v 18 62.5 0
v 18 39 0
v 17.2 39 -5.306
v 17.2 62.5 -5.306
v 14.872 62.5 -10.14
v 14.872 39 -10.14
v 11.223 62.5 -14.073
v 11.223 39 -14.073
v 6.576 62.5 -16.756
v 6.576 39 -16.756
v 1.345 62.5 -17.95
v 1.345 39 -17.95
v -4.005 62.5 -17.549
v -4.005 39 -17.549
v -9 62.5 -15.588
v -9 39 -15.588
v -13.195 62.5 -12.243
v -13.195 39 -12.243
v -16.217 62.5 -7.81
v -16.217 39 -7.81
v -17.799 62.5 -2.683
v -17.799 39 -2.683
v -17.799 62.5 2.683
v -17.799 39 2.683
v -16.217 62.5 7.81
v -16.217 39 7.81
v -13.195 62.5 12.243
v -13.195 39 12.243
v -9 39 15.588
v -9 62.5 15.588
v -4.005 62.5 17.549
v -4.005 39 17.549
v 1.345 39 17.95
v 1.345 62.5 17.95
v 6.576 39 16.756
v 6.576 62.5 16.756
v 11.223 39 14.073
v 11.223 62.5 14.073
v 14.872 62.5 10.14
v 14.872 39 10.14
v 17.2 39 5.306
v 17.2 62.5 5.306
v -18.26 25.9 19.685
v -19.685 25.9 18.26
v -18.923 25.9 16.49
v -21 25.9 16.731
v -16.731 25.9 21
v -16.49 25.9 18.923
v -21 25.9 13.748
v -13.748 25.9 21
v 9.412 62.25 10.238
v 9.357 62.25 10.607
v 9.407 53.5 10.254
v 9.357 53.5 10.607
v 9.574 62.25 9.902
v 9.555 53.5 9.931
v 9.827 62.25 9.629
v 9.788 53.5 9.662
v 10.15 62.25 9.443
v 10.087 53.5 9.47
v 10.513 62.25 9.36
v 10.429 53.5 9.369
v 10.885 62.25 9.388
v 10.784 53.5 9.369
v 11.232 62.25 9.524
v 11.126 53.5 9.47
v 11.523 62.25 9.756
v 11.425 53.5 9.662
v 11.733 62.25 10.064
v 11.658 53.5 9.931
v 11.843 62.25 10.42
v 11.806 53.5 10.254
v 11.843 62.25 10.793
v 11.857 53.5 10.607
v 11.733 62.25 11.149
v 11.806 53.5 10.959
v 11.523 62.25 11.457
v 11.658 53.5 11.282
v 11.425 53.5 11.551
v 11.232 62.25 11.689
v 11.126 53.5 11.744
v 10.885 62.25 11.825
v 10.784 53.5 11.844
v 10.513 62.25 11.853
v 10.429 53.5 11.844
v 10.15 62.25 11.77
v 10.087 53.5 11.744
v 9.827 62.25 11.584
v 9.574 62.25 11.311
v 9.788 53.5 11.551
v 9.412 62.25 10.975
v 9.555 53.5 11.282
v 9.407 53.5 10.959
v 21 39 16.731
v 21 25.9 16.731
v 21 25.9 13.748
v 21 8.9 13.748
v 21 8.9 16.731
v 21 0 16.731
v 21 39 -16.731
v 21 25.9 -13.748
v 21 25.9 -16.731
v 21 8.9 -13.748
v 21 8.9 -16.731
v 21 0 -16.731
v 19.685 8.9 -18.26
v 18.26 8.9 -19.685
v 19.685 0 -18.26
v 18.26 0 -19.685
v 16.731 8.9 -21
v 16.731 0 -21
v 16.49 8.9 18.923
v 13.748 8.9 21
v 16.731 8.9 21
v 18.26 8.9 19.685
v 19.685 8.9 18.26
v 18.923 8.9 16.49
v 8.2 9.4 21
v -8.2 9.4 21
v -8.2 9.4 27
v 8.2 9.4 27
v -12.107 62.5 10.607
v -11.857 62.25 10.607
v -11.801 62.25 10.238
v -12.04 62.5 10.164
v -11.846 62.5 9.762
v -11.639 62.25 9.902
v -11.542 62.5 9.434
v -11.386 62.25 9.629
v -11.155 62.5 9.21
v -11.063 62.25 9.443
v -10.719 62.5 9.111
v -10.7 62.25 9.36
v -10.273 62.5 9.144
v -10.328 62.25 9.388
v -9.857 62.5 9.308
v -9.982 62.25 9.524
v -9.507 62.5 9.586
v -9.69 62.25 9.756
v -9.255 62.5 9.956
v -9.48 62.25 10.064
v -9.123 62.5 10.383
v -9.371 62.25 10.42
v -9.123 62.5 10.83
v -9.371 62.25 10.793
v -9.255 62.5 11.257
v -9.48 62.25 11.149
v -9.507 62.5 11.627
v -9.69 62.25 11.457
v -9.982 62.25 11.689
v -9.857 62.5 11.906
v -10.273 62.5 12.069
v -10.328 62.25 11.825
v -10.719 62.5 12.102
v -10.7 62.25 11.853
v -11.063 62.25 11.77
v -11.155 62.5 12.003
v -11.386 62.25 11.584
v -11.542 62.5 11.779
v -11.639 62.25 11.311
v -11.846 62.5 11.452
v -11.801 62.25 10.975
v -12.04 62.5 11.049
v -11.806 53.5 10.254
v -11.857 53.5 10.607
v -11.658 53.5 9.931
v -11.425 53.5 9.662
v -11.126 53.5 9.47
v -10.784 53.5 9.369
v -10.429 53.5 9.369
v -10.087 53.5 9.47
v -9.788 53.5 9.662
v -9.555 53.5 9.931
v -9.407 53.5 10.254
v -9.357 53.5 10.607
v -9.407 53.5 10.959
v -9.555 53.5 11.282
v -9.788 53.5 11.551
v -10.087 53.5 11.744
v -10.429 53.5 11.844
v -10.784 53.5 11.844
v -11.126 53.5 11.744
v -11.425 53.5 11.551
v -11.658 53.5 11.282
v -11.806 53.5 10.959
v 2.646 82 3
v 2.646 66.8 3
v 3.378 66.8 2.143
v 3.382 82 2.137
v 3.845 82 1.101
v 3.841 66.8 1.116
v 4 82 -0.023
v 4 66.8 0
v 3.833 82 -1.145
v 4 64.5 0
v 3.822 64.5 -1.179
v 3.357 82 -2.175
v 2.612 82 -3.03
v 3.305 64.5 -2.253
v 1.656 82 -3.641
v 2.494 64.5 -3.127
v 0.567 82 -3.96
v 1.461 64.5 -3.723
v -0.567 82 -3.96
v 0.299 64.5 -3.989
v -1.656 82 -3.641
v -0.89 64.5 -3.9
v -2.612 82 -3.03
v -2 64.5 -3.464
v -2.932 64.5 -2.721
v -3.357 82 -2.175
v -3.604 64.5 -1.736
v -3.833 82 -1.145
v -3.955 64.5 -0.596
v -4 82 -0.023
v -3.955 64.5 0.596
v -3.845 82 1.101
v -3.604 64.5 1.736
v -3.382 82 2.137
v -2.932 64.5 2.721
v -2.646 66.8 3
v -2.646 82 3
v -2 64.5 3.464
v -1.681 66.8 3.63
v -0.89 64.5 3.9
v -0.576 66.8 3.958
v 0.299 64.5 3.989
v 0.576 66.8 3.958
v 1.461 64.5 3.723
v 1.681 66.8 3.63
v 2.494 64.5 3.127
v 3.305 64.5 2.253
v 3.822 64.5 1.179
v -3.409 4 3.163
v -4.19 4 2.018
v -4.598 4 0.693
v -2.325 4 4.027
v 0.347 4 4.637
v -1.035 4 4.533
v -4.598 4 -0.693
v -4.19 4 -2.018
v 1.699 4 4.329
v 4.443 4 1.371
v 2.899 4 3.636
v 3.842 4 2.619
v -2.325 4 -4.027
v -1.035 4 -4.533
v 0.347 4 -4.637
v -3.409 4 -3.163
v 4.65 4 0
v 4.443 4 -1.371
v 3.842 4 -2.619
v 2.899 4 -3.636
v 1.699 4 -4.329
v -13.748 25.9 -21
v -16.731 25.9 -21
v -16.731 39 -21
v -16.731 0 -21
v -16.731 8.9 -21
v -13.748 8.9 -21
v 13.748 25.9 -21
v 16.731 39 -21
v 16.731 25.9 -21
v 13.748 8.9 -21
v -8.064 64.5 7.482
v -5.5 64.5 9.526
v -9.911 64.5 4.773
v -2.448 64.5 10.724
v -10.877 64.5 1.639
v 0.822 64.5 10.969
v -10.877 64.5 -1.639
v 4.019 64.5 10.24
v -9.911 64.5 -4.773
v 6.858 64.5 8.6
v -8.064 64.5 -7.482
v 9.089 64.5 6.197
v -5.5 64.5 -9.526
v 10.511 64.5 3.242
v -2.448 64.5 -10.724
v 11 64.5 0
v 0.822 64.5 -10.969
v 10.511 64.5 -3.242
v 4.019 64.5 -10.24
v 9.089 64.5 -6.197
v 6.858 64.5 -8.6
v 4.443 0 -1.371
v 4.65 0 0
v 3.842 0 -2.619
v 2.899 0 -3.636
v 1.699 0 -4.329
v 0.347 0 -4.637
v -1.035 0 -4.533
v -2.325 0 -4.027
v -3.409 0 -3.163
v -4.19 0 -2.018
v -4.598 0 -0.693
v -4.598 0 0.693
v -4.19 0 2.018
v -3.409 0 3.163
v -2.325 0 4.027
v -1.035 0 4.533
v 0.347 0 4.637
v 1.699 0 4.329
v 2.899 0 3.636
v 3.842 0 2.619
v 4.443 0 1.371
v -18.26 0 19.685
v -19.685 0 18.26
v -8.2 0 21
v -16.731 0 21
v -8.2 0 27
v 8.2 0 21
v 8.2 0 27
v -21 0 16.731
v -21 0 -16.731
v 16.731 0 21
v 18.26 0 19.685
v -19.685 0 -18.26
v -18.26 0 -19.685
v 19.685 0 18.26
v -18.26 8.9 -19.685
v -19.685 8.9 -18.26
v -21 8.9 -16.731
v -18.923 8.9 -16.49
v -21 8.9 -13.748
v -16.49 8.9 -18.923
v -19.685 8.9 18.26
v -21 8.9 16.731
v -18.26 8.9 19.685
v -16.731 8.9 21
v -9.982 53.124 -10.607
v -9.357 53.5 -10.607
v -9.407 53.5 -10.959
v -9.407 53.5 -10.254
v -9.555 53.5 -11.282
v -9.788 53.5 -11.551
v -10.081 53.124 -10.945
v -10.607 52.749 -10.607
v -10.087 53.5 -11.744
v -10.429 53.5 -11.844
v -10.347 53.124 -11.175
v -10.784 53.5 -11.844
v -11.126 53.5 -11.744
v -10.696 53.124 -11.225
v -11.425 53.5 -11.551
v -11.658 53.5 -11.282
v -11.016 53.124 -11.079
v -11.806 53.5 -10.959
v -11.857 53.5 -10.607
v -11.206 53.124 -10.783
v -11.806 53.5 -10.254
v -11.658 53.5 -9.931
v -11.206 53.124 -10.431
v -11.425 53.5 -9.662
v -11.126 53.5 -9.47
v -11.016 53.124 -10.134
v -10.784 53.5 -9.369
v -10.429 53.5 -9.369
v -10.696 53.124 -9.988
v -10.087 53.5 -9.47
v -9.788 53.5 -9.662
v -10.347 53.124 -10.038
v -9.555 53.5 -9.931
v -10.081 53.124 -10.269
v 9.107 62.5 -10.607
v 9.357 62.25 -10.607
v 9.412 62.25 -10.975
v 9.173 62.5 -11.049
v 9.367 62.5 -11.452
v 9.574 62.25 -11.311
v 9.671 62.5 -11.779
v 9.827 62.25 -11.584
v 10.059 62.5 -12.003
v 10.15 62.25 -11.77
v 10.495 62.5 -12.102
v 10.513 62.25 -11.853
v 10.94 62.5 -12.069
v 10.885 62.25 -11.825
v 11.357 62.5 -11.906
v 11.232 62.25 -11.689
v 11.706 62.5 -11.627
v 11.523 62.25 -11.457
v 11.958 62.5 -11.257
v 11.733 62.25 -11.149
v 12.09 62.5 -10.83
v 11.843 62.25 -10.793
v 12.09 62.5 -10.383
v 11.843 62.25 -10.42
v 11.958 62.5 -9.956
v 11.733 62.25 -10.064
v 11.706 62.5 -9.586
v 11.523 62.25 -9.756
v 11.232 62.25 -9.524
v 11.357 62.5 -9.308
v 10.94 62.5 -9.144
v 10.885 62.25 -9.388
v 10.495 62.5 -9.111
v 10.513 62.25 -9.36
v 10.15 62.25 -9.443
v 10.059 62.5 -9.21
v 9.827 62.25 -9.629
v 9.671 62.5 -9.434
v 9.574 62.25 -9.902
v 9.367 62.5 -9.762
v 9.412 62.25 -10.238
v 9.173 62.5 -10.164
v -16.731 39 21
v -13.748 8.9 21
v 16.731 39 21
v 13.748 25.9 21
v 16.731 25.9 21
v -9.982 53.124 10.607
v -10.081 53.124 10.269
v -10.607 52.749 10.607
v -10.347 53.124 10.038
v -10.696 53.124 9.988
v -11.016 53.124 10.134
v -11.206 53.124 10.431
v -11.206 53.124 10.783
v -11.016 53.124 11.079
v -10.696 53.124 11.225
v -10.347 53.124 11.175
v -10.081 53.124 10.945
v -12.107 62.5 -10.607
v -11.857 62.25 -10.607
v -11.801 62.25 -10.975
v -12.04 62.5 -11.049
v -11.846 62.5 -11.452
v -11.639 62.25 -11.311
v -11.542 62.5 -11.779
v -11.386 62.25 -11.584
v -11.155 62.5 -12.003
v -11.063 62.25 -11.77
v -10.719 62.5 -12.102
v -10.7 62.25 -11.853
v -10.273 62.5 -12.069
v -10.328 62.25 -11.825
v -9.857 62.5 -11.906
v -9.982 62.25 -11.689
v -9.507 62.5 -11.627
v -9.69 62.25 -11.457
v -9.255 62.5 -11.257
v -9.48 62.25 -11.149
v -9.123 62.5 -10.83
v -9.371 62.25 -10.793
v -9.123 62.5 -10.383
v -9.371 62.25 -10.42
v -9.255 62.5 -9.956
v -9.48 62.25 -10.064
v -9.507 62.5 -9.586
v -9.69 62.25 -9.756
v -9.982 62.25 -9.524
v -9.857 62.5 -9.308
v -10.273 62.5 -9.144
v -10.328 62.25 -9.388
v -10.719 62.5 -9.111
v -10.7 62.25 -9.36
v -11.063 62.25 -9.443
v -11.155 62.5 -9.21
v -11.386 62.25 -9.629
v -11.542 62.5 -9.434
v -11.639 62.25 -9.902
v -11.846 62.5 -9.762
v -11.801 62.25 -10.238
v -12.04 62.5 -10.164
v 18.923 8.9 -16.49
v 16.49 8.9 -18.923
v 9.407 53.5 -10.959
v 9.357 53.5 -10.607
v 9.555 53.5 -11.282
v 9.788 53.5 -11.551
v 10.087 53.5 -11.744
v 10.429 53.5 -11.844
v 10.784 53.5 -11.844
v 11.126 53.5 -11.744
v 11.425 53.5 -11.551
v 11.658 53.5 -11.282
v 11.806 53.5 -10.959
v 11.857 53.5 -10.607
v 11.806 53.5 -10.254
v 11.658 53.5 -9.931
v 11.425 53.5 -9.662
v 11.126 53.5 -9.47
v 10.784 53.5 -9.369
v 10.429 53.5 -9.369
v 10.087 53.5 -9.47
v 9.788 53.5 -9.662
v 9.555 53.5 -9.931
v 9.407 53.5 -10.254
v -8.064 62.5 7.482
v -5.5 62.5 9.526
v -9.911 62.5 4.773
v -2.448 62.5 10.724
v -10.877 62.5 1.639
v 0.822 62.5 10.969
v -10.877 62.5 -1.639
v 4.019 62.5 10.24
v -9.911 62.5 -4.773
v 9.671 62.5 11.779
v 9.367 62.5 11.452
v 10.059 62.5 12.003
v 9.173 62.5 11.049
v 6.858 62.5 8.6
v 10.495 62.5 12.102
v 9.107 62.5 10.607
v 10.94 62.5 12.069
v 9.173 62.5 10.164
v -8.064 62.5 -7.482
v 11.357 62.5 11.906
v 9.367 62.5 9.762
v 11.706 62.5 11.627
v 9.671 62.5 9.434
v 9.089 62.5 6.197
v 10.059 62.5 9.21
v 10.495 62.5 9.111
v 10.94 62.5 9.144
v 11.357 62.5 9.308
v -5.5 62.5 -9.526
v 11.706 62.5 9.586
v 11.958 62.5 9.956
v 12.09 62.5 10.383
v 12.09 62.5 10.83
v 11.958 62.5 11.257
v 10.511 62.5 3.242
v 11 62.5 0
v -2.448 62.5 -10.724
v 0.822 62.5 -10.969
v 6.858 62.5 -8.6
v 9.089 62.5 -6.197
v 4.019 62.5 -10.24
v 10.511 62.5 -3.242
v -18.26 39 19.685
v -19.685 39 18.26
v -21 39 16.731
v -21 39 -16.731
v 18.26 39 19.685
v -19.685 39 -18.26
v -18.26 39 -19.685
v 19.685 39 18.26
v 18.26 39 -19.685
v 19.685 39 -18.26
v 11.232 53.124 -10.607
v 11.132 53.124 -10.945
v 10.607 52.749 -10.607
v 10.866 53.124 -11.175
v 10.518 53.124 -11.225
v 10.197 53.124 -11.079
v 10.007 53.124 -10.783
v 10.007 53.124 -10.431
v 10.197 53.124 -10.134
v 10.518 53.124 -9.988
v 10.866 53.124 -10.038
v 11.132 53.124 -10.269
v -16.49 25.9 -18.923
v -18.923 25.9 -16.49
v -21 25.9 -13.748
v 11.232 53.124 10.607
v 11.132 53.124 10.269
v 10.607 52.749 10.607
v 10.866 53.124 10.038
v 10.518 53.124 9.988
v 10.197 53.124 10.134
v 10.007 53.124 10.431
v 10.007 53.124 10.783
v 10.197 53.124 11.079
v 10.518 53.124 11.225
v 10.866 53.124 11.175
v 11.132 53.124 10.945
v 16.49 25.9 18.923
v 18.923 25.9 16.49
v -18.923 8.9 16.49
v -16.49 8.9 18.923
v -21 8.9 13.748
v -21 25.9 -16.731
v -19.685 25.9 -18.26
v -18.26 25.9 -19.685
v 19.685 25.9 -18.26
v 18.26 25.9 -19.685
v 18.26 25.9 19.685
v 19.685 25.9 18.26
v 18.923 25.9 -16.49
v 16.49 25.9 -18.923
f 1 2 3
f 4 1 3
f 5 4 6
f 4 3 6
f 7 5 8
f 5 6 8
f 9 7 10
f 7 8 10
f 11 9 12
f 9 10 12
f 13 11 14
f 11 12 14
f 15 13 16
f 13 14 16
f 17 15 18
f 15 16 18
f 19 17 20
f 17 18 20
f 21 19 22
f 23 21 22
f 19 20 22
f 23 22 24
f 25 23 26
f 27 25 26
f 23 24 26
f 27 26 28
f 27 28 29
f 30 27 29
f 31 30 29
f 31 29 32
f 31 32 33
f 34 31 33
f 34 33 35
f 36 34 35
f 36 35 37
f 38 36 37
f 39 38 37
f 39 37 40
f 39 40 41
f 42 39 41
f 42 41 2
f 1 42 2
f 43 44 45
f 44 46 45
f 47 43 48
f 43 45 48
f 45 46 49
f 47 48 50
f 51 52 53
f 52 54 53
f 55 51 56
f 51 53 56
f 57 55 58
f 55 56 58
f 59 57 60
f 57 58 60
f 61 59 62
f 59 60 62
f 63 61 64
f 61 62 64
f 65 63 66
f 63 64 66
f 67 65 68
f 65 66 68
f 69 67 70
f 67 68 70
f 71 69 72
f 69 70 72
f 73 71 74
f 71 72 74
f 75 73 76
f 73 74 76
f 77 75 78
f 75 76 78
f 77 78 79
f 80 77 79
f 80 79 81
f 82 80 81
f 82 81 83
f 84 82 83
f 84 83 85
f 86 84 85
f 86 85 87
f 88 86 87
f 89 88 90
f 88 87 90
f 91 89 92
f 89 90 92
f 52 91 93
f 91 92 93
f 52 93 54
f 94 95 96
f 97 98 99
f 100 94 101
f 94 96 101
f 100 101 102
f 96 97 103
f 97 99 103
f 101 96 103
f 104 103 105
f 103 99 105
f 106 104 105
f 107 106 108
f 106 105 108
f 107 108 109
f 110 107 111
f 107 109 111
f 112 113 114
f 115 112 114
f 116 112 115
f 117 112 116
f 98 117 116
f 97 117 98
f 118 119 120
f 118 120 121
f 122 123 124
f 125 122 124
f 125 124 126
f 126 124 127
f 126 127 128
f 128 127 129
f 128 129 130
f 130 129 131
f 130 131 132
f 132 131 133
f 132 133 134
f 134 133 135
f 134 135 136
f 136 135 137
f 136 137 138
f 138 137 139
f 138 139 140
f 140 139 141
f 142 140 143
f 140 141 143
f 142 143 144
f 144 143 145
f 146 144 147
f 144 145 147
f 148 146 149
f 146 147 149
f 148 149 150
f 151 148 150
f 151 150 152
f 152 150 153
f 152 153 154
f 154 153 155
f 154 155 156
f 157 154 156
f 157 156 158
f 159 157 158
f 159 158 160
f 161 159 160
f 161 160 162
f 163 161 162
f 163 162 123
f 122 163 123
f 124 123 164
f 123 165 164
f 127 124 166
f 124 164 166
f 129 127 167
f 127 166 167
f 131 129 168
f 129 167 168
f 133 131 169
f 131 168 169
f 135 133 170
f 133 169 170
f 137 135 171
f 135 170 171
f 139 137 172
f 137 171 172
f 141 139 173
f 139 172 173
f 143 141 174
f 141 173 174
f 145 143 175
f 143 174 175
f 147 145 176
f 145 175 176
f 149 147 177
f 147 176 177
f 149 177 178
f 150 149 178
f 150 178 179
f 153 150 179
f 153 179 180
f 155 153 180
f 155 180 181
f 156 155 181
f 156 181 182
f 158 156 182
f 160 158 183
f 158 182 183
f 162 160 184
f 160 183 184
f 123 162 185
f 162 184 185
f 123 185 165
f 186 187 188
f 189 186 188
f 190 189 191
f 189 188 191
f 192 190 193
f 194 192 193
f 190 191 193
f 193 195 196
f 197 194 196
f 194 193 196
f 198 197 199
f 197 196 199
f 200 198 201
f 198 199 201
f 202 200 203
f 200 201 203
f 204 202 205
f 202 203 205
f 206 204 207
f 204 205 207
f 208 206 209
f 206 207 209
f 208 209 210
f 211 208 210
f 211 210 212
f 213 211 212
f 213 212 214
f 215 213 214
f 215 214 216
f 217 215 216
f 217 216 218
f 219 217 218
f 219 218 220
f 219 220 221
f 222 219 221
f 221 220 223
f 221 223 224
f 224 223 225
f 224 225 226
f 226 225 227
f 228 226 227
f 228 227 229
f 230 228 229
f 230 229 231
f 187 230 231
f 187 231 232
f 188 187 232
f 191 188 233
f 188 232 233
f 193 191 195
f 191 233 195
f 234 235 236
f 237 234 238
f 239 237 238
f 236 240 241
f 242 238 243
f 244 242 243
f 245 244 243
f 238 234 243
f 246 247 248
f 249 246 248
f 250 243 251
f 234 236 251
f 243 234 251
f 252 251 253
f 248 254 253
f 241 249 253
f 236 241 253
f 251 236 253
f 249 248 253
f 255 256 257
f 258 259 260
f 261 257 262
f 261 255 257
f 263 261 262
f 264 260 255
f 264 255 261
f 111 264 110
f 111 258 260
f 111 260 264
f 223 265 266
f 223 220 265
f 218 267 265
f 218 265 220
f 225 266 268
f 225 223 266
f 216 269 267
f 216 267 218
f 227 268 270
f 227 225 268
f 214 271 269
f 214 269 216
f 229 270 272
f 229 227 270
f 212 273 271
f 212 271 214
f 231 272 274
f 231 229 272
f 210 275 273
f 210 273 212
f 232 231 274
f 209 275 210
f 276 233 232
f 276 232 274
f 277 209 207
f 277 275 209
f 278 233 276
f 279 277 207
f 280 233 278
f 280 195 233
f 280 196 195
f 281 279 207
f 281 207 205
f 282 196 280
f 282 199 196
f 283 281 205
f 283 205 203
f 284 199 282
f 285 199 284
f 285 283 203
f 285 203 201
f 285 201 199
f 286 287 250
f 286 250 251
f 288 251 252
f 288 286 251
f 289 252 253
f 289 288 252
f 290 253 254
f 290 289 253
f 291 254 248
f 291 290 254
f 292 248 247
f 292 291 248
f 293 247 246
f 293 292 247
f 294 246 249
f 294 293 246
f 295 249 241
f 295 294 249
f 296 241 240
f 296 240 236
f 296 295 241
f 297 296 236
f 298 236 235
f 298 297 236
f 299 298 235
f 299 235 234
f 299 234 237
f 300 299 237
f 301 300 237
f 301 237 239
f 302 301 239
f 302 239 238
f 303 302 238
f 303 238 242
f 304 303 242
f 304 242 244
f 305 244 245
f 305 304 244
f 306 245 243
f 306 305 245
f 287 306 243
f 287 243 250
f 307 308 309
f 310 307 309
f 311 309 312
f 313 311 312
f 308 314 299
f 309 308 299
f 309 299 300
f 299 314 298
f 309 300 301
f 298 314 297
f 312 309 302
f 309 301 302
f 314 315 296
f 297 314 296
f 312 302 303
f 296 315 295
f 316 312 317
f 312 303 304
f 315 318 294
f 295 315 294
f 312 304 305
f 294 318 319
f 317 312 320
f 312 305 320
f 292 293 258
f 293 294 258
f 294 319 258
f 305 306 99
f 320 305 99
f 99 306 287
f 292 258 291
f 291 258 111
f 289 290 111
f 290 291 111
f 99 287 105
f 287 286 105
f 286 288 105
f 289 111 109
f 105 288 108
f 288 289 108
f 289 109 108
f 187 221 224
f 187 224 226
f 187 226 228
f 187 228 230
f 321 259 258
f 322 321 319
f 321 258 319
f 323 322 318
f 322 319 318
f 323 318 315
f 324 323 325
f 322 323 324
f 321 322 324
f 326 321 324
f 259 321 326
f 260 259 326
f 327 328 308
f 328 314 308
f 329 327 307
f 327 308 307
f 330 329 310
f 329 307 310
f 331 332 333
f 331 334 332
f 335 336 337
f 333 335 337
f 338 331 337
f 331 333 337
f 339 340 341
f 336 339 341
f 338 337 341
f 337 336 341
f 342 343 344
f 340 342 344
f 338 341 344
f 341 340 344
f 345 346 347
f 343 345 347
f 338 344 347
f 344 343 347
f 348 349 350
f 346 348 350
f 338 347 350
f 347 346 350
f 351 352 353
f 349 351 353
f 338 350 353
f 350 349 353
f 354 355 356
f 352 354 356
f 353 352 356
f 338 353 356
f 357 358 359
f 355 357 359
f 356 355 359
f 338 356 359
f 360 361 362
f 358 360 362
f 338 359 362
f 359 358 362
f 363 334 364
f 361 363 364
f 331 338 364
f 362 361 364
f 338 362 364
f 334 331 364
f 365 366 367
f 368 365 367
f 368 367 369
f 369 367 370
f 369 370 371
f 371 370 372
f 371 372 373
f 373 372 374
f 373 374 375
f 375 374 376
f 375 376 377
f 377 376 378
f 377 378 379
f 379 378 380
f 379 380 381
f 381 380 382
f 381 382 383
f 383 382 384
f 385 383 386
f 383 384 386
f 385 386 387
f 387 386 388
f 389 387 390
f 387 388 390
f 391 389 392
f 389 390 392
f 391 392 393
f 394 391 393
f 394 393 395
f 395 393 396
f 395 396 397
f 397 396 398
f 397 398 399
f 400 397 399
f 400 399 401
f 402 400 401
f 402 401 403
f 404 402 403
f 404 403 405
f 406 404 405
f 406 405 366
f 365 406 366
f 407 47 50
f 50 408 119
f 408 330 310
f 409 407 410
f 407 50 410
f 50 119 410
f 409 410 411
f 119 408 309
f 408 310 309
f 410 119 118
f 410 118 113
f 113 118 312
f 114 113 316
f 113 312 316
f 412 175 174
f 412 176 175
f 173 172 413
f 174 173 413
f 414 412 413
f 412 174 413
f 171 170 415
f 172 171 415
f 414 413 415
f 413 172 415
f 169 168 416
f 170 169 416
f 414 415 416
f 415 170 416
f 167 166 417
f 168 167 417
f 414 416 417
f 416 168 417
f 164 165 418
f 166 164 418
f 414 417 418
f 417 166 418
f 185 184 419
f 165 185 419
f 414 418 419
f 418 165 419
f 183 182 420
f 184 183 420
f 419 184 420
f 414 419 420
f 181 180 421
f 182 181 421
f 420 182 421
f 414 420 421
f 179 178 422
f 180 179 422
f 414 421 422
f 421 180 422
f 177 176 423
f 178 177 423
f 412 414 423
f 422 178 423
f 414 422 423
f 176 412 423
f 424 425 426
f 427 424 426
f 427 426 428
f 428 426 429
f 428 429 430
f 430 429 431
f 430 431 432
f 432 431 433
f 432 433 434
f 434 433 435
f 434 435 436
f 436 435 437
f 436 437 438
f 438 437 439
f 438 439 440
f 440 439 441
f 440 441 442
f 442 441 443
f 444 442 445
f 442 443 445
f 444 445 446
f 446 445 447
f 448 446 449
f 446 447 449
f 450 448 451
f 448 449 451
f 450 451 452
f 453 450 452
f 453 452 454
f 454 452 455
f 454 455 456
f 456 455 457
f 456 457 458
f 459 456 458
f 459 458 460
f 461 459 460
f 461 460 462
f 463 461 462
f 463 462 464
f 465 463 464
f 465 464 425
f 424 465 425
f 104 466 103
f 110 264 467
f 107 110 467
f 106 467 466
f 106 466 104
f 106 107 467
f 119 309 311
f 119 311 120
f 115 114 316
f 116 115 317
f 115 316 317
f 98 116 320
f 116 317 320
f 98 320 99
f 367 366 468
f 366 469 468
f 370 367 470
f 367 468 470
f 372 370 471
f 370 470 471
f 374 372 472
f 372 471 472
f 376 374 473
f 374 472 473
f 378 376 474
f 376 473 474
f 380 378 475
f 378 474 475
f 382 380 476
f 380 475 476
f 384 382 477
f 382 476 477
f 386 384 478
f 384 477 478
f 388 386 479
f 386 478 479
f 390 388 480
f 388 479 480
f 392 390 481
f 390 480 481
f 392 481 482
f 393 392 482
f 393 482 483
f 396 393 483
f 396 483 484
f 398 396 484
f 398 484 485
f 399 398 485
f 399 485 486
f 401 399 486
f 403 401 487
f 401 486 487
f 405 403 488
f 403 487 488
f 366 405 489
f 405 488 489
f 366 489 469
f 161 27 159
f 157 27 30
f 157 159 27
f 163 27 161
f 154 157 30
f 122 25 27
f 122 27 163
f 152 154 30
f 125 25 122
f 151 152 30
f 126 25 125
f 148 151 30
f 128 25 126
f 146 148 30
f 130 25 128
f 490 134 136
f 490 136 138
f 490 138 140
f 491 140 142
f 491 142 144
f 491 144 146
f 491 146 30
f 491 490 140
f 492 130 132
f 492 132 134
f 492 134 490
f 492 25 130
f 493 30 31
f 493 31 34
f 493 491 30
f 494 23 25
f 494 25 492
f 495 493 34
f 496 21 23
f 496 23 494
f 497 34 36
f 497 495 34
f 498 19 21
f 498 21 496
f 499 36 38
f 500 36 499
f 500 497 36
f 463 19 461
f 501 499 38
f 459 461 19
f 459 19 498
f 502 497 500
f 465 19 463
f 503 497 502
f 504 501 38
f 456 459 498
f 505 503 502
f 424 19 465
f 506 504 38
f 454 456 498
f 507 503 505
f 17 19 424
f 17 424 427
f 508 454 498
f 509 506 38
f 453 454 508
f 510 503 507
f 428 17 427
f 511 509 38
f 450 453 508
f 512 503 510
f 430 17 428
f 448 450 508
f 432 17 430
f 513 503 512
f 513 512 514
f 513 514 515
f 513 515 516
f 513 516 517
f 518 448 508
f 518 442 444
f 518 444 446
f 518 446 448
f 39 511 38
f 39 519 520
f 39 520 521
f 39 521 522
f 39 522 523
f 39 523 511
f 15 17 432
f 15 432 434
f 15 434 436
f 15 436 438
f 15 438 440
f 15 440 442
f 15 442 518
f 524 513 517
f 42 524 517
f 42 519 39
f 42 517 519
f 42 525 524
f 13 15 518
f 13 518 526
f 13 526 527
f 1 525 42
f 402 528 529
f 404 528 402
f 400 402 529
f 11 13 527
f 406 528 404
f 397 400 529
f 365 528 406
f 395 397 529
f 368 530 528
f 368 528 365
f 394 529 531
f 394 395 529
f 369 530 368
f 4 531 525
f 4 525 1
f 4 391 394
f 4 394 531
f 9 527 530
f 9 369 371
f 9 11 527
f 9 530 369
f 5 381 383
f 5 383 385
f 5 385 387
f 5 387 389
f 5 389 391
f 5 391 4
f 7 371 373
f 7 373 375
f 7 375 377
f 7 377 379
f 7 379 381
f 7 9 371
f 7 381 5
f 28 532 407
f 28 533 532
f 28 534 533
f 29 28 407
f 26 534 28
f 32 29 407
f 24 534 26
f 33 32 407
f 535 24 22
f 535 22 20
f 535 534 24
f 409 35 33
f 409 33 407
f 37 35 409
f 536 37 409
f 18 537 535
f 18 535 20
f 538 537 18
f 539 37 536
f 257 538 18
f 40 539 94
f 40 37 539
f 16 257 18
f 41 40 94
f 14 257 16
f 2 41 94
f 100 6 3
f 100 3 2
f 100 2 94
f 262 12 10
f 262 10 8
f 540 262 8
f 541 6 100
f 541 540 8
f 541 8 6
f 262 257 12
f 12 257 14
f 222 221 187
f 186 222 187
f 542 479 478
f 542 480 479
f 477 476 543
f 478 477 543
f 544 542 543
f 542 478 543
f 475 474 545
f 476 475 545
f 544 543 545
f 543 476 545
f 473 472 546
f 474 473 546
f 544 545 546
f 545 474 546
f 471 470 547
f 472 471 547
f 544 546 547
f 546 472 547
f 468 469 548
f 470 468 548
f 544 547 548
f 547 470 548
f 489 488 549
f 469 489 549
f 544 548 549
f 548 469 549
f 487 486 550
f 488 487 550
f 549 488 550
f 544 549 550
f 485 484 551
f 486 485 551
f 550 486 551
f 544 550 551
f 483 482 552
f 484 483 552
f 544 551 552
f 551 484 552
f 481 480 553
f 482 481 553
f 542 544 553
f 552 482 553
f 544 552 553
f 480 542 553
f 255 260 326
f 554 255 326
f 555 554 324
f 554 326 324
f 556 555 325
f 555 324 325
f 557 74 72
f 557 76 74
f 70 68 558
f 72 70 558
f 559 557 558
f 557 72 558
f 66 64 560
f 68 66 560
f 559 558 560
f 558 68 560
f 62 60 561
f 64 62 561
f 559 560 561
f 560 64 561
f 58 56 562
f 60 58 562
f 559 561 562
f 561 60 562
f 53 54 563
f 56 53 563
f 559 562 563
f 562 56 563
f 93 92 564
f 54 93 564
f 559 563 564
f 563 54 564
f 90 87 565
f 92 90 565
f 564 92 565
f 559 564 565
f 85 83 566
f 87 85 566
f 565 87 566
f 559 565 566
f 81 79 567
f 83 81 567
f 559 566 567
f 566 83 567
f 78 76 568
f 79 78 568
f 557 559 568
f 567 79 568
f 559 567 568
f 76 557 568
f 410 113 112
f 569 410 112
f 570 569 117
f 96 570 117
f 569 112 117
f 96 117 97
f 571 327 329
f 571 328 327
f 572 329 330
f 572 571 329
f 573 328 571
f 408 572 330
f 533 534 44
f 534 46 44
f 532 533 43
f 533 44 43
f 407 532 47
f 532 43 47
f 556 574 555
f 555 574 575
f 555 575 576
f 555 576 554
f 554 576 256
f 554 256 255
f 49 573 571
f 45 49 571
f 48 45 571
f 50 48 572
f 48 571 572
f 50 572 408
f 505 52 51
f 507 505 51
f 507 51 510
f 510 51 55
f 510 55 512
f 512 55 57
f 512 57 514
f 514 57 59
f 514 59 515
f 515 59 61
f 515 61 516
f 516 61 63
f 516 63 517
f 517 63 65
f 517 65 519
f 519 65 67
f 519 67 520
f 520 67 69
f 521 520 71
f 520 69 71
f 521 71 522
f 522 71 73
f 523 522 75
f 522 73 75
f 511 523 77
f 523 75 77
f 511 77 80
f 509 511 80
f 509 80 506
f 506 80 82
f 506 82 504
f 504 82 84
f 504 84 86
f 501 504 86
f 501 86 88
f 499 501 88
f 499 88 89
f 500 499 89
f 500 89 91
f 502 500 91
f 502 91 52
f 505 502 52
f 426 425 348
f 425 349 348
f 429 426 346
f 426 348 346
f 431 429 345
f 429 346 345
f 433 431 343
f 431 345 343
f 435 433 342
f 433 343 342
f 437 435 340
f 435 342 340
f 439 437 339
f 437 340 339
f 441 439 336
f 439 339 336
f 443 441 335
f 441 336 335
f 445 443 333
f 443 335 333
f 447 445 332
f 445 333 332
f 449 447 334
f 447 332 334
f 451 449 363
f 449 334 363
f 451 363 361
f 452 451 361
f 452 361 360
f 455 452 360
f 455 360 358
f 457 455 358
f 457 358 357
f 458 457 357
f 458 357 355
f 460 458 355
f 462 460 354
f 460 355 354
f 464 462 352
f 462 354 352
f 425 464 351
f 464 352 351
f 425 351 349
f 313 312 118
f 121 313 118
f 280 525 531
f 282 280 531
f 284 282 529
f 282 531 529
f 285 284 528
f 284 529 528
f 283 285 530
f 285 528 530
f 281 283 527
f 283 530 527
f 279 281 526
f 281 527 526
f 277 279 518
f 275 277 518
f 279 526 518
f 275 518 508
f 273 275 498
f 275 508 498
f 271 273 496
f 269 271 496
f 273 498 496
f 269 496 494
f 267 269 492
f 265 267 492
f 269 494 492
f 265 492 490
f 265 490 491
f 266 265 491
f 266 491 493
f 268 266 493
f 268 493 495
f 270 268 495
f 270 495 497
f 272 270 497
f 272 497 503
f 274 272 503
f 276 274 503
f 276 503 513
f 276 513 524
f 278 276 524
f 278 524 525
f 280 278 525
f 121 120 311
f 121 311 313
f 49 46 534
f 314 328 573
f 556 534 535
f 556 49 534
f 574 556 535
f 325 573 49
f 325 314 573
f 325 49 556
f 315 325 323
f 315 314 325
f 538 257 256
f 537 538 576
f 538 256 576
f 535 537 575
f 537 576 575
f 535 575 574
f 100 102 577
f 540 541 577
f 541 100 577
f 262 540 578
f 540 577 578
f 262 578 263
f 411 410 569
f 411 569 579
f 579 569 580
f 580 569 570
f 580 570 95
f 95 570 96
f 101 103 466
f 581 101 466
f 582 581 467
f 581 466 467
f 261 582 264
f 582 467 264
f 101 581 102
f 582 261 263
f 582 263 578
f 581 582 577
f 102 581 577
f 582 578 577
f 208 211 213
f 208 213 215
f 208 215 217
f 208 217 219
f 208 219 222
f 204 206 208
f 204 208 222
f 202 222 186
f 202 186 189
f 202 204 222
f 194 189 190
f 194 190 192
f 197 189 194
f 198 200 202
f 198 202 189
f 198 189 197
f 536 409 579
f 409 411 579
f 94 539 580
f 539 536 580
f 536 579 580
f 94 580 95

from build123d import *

# Parameters (mm, degrees)
SZKIC1_W                         = 42
SZKIC1_H                         = 42
DODANIE_WYCI_GNI_CIE1_DEPTH      = 39
SZKIC1_3_R                       = 18
DODANIE_WYCI_GNI_CIE2_DEPTH      = 62.5
SZKIC1_4_R                       = 11
DODANIE_WYCI_GNI_CIE3_DEPTH      = 64.5
SZKIC1_5_R                       = 4
DODANIE_WYCI_GNI_CIE4_DEPTH      = 66.8
DODANIE_WYCI_GNI_CIE5_DEPTH      = 82
SZKIC2_OUTSIDE_W                 = 64.25
SZKIC2_OUTSIDE_H                 = 64.25
SZKIC2_OUTSIDE_R                 = 26.85
WYTNIJ_WYCI_GNI_CIE2_DEPTH       = 83
WYTNIJ_WYCI_GNI_CIE3_START       = 8.9
SZKIC3_OUTSIDE_W                 = 64.25
SZKIC3_OUTSIDE_H                 = 64.25
SZKIC3_OUTSIDE_R                 = 25.1
WYTNIJ_WYCI_GNI_CIE3_DEPTH       = 17
SZKIC4_R                         = 4.65
WYTNIJ_WYCI_GNI_CIE5_DEPTH       = 4
OTW_R_GWINTOWANY_M31_D           = 2.5
OTW_R_GWINTOWANY_M31_DEPTH       = 9
OTW_R_GWINTOWANY_M31_CSINK_D     = 3
OTW_R_GWINTOWANY_M31_CSINK_ANGLE = 90
OTW_R_GWINTOWANY_M31_TIP         = 0.751075774
DODANIE_WYCI_GNI_CIE6_START      = 21
SZKIC18_W                        = 16.4
SZKIC18_H                        = 9.4
DODANIE_WYCI_GNI_CIE6_DEPTH      = 6


with BuildPart() as part:
    # Szkic1 → Dodanie-wyci_gni_cie1 (new body)
    with BuildSketch(Plane(origin=(0, 0, 0), x_dir=(1, 0, 0), z_dir=(0, 1, 0))):
        Rectangle(SZKIC1_W, SZKIC1_H)
    extrude(amount=DODANIE_WYCI_GNI_CIE1_DEPTH)

    # Szkic1_3 → Dodanie-wyci_gni_cie2 (add)
    with BuildSketch(Plane(origin=(0, 0, 0), x_dir=(1, 0, 0), z_dir=(0, 1, 0))):
        Circle(SZKIC1_3_R)
    extrude(amount=DODANIE_WYCI_GNI_CIE2_DEPTH)

    # Szkic1_4 → Dodanie-wyci_gni_cie3 (add)
    with BuildSketch(Plane(origin=(0, 0, 0), x_dir=(1, 0, 0), z_dir=(0, 1, 0))):
        Circle(SZKIC1_4_R)
    extrude(amount=DODANIE_WYCI_GNI_CIE3_DEPTH)

    # Szkic1_5 → Dodanie-wyci_gni_cie4 (add)
    with BuildSketch(Plane(origin=(0, 0, 0), x_dir=(1, 0, 0), z_dir=(0, 1, 0))):
        Circle(SZKIC1_5_R)
    extrude(amount=DODANIE_WYCI_GNI_CIE4_DEPTH)

    # Szkic1_6 → Dodanie-wyci_gni_cie5 (add)
    with BuildSketch(Plane(origin=(0, 0, 0), x_dir=(1, 0, 0), z_dir=(0, 1, 0))):
        with BuildLine():
            Line((-2.645751311, -3), (2.645751311, -3))
            ThreePointArc((2.645751311, -3), (0, 4), (-2.645751311, -3))
        make_face()
    extrude(amount=DODANIE_WYCI_GNI_CIE5_DEPTH)

    # Szkic2 outside → Wytnij-wyci_gni_cie2 (cut, through all)
    with BuildSketch(Plane(origin=(0, 0, 0), x_dir=(1, 0, 0), z_dir=(0, 1, 0))):
        Rectangle(SZKIC2_OUTSIDE_W, SZKIC2_OUTSIDE_H)
        Circle(SZKIC2_OUTSIDE_R, mode=Mode.SUBTRACT)
    extrude(amount=WYTNIJ_WYCI_GNI_CIE2_DEPTH, mode=Mode.SUBTRACT)

    # Szkic3 outside → Wytnij-wyci_gni_cie3 (cut)
    with BuildSketch(Plane(origin=(0, 0, 0), x_dir=(1, 0, 0), z_dir=(0, 1, 0)).offset(WYTNIJ_WYCI_GNI_CIE3_START)):
        Rectangle(SZKIC3_OUTSIDE_W, SZKIC3_OUTSIDE_H)
        Circle(SZKIC3_OUTSIDE_R, mode=Mode.SUBTRACT)
    extrude(amount=WYTNIJ_WYCI_GNI_CIE3_DEPTH, mode=Mode.SUBTRACT)

    # Szkic4 → Wytnij-wyci_gni_cie5 (cut)
    with BuildSketch(Plane(origin=(0, 0, 0), x_dir=(1, 0, 0), z_dir=(0, 1, 0))):
        Circle(SZKIC4_R)
    extrude(amount=WYTNIJ_WYCI_GNI_CIE5_DEPTH, mode=Mode.SUBTRACT)

    # Otw_r gwintowany M31
    with Locations(Plane(origin=(0, 62.5, 0), x_dir=(1, 0, 0), z_dir=(0, 1, 0))):
        with Locations((-10.606601718, 10.606601718), (10.606601718, 10.606601718), (10.606601718, -10.606601718), (-10.606601718, -10.606601718)):
            CounterSinkHole(OTW_R_GWINTOWANY_M31_D / 2, OTW_R_GWINTOWANY_M31_CSINK_D / 2, depth=OTW_R_GWINTOWANY_M31_DEPTH, counter_sink_angle=OTW_R_GWINTOWANY_M31_CSINK_ANGLE)
            with Locations((0, 0, -(OTW_R_GWINTOWANY_M31_DEPTH + OTW_R_GWINTOWANY_M31_TIP / 2))):  # 118° drill point
                Cone(0, OTW_R_GWINTOWANY_M31_D / 2, OTW_R_GWINTOWANY_M31_TIP, mode=Mode.SUBTRACT)

    # Szkic18 → Dodanie-wyci_gni_cie6 (add)
    with BuildSketch(Plane.XY.offset(DODANIE_WYCI_GNI_CIE6_START)):
        with Locations((0, 4.7)):
            Rectangle(SZKIC18_W, SZKIC18_H)
    extrude(amount=DODANIE_WYCI_GNI_CIE6_DEPTH)


solid = part.part
